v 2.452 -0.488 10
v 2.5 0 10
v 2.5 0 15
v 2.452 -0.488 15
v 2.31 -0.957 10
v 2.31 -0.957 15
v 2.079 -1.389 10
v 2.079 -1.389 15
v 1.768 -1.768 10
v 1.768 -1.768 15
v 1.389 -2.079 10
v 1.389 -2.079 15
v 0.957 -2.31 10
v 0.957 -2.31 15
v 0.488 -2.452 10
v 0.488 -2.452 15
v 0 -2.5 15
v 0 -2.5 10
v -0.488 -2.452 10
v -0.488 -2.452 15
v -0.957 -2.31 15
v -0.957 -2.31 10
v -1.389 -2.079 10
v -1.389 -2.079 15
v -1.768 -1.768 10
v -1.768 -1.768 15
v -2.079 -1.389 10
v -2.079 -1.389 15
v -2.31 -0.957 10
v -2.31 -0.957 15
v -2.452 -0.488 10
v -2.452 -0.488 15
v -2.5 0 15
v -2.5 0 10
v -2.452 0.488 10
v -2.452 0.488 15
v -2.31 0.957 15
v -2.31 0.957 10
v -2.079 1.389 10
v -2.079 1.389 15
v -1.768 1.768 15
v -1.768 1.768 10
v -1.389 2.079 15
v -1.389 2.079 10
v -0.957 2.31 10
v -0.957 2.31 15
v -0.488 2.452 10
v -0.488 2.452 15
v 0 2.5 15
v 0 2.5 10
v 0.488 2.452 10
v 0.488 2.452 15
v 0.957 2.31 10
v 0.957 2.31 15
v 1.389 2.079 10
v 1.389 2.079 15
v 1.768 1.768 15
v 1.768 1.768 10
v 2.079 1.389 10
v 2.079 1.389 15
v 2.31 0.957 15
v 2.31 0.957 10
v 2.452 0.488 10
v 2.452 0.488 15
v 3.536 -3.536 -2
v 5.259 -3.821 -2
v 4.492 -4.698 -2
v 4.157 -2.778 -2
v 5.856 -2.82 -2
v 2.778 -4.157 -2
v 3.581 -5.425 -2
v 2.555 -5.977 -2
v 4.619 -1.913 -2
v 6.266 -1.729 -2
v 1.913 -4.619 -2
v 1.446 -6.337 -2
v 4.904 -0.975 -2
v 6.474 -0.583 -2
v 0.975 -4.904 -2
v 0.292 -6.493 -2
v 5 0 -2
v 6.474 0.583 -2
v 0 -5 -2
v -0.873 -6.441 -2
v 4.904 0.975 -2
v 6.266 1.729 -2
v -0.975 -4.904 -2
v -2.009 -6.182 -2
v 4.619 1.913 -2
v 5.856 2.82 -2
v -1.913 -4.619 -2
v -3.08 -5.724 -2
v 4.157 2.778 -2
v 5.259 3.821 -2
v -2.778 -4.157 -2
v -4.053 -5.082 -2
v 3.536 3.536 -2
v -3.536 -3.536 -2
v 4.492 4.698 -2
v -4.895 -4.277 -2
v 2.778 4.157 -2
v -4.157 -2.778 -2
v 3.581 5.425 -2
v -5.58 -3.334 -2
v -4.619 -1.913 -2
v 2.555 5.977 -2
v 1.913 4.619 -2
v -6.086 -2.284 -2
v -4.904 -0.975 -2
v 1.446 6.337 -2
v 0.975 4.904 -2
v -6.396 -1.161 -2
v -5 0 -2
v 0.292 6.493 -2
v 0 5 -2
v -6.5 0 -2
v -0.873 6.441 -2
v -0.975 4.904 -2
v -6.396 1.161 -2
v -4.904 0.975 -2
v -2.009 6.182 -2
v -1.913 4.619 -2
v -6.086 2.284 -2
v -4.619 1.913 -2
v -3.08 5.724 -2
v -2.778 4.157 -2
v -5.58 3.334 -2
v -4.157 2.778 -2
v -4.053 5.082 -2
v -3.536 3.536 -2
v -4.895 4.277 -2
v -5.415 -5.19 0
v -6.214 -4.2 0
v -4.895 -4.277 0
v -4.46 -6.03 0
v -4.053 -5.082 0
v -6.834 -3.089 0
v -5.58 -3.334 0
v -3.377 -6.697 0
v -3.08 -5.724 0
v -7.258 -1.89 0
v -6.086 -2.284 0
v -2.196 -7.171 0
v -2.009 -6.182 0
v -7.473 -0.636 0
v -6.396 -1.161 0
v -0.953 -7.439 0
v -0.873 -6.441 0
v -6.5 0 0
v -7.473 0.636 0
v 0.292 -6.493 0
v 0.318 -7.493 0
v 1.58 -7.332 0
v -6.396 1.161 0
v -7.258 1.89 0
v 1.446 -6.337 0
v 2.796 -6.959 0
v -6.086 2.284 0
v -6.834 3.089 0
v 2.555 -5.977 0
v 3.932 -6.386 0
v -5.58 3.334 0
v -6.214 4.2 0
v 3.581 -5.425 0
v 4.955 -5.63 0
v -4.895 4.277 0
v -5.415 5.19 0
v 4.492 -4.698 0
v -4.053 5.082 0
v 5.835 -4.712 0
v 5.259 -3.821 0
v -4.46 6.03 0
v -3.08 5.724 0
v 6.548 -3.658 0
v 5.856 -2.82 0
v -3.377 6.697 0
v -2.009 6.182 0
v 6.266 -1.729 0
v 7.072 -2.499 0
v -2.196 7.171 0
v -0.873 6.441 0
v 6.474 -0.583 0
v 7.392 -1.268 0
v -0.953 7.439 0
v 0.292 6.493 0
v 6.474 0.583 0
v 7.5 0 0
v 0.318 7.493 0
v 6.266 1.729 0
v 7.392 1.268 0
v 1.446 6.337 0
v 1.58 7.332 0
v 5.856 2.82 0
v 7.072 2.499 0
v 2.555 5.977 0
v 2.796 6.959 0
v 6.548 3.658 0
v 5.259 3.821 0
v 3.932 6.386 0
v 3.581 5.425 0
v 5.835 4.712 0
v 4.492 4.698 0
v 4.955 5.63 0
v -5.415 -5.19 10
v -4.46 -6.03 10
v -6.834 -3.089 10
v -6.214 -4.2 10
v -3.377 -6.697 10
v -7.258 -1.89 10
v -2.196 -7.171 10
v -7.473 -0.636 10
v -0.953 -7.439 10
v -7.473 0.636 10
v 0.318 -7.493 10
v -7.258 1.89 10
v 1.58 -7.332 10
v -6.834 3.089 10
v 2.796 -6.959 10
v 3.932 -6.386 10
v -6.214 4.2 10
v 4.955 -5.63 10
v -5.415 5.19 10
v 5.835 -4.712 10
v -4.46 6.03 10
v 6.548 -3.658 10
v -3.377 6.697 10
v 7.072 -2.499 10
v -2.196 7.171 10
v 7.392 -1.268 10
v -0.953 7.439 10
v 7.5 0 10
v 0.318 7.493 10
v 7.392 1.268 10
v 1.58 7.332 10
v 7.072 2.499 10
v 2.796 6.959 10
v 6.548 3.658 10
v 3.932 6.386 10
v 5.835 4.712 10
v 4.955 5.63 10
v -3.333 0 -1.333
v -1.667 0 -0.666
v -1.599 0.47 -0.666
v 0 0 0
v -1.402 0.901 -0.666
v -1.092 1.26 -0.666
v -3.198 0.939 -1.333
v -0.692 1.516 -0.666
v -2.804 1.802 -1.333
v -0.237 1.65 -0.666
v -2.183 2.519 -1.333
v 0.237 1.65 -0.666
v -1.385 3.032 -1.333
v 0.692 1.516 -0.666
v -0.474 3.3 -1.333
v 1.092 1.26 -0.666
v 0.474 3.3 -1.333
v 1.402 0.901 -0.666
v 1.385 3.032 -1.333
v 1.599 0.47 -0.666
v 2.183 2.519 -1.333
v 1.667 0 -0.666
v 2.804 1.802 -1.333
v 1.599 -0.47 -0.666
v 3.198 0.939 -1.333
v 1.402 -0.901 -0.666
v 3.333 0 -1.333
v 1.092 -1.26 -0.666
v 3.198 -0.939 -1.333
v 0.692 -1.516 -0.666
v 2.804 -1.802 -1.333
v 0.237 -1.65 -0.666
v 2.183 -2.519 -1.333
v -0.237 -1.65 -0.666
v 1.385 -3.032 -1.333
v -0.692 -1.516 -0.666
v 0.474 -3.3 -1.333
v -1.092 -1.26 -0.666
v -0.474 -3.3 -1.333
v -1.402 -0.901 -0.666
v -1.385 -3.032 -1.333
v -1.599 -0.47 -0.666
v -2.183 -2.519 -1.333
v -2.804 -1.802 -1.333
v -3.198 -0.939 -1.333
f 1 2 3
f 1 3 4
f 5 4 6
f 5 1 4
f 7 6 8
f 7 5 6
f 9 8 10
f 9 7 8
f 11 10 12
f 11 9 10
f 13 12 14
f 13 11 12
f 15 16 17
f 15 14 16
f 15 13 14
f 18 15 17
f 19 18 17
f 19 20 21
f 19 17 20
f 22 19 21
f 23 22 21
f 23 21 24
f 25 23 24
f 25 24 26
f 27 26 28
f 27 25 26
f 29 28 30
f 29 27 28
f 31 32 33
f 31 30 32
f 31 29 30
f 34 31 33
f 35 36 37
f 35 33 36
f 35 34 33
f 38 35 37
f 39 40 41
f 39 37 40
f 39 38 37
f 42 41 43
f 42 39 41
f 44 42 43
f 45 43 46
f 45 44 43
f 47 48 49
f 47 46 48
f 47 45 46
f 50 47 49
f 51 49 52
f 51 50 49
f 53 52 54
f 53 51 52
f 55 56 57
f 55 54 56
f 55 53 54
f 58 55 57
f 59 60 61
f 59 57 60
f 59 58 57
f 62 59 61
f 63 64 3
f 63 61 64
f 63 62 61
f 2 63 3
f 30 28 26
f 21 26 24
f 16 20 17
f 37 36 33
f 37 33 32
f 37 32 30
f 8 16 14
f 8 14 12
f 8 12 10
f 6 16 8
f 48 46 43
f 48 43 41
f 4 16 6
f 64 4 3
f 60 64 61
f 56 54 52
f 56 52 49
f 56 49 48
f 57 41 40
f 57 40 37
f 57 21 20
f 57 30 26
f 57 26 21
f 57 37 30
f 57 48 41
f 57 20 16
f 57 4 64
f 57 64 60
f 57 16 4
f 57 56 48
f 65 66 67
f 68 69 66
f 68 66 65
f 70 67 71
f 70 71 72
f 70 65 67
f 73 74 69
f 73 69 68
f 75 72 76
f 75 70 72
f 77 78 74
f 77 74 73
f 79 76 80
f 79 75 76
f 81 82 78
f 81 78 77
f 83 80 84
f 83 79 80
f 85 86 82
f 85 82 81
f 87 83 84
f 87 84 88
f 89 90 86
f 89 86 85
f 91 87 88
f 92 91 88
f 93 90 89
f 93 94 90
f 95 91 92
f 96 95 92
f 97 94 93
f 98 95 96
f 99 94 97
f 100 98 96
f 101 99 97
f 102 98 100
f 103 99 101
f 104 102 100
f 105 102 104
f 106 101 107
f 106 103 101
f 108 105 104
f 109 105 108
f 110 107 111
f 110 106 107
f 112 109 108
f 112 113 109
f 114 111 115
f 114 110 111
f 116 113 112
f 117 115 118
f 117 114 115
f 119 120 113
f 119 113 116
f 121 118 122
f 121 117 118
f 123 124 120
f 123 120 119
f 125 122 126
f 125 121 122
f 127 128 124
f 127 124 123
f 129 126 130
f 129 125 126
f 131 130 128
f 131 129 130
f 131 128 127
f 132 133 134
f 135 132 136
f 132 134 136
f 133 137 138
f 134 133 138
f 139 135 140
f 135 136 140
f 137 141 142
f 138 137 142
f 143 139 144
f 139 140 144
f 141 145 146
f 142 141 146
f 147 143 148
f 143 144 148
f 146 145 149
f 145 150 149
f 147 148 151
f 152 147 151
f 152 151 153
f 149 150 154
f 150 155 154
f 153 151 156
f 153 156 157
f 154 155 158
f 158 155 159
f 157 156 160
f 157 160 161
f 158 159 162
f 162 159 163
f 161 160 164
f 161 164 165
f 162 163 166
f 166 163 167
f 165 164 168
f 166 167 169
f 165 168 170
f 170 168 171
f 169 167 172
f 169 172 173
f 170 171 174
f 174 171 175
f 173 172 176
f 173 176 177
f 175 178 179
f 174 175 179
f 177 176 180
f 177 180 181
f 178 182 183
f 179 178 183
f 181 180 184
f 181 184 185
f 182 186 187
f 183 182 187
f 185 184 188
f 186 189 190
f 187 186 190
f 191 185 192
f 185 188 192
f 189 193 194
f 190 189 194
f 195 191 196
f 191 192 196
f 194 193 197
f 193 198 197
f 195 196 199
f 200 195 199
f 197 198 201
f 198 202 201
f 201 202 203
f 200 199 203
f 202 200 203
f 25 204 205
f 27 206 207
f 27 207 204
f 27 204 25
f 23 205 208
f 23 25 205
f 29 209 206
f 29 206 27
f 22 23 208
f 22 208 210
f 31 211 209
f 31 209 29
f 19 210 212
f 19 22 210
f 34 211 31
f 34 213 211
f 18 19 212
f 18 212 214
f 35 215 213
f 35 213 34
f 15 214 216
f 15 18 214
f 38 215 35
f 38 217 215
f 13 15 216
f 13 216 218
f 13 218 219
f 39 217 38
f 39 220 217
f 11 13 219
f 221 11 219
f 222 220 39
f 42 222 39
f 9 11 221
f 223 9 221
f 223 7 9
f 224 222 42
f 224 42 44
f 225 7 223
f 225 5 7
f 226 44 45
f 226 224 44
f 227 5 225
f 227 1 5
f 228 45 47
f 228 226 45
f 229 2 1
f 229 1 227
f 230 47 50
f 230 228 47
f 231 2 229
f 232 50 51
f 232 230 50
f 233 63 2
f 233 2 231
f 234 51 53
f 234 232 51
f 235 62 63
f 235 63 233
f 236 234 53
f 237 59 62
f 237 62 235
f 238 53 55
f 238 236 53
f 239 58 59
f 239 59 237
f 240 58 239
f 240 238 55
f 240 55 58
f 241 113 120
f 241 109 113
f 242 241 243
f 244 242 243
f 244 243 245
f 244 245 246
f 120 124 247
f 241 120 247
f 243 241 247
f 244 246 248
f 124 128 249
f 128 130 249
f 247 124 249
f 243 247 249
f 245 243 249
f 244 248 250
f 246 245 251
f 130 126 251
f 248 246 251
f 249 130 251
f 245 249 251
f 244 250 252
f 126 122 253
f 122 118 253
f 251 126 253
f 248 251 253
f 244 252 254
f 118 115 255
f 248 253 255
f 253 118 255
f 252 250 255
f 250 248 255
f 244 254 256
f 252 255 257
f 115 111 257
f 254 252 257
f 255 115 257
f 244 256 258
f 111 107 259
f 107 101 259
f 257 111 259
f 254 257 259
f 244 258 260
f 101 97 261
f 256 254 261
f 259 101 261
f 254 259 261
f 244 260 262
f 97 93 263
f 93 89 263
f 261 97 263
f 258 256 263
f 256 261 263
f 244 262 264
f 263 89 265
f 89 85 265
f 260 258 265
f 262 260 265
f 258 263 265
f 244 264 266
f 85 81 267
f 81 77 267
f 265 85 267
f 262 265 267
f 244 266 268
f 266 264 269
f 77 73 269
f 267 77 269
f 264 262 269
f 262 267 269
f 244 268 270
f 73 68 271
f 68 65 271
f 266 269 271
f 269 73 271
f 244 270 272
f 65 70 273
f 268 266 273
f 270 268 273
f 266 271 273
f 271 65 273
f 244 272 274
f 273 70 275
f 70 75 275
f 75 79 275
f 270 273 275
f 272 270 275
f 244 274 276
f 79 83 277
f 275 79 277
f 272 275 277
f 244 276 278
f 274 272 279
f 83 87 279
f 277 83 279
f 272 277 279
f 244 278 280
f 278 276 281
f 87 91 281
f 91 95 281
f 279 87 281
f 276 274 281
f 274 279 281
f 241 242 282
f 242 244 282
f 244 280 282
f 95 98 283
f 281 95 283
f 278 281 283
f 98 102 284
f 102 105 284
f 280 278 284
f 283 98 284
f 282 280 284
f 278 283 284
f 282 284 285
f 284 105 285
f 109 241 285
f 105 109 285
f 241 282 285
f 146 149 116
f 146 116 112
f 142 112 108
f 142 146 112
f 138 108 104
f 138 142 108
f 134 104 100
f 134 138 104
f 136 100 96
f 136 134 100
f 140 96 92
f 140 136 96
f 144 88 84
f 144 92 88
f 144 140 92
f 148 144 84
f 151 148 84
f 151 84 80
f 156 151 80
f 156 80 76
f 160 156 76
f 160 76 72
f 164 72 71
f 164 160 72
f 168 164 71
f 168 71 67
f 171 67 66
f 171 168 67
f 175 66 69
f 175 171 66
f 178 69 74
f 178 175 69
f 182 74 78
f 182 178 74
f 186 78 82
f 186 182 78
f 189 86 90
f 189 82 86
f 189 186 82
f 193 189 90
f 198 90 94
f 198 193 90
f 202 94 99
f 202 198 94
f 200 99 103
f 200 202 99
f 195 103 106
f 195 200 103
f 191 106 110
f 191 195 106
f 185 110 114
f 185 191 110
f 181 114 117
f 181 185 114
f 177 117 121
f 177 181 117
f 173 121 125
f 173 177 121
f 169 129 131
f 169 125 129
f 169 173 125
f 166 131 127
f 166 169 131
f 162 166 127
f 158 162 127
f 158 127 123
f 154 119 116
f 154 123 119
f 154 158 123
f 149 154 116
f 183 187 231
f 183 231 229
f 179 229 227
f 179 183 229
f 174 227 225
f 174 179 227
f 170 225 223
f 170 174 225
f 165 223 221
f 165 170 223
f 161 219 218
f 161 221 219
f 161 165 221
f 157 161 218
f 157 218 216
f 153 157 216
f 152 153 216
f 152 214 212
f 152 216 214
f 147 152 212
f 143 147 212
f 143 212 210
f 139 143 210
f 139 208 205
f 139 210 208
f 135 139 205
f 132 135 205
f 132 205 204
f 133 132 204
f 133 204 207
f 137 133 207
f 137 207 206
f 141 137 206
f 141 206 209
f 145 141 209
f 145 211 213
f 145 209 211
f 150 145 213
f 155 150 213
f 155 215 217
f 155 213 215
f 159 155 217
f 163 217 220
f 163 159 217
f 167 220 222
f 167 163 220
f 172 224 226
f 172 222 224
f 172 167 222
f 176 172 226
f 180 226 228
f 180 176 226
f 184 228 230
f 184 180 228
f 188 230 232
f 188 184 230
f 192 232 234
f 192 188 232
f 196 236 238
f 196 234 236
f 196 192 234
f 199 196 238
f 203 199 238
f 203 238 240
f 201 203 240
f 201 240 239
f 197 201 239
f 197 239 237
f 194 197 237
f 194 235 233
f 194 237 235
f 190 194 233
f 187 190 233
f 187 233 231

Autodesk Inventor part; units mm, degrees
ref_plane "YZ Plane" through (0, 0, 0) normal (1, 0, 0) x (0, 1, 0)
ref_plane "XZ Plane" through (0, 0, 0) normal (0, 1, 0) x (-1, 0, 0)
ref_plane "XY Plane" through (0, 0, 0) normal (0, 0, 1) x (1, 0, 0)
sketch "Sketch1" plane through (0, 0, 0) normal (0, 0, 1) x (1, 0, 0)
  circle A0 centre (0, 0) radius 7.5
  dimension "d0" = 15
extrude "Extrusion1" add sketch "Sketch1" along normal blind 10
sketch "Sketch2" plane through (0, 0, 0) normal (0, 0, -1) x (-1, 0, 0)
  circle A0 centre (0, 0) radius 6.5
  circle A1 centre (0, 0) radius 5
  circle A2 centre (0, 0) radius 7.5 projected
  dimension "d3" = 13
  dimension "d4" = 15
  dimension "d5" = 10
extrude "Extrusion2" add sketch "Sketch2" along normal blind 2 contours A0
sketch "Sketch3" plane through (0, 0, 10) normal (0, 0, 1) x (1, 0, 0)
  circle A0 centre (0, 0) radius 7.5 projected
  circle A1 centre (0, 0) radius 2.5
  dimension "d8" = 15
  dimension "d13" = 5
extrude "Extrusion3" add sketch "Sketch3" along normal blind 5 contours A1
chamfer "Chamfer1" distance 2 angle 68.199 1 edges at (5, 0, 0) measured on face at (-4.9838, -0.4023, -1.3333)
properties part number "stredne_koleso"
